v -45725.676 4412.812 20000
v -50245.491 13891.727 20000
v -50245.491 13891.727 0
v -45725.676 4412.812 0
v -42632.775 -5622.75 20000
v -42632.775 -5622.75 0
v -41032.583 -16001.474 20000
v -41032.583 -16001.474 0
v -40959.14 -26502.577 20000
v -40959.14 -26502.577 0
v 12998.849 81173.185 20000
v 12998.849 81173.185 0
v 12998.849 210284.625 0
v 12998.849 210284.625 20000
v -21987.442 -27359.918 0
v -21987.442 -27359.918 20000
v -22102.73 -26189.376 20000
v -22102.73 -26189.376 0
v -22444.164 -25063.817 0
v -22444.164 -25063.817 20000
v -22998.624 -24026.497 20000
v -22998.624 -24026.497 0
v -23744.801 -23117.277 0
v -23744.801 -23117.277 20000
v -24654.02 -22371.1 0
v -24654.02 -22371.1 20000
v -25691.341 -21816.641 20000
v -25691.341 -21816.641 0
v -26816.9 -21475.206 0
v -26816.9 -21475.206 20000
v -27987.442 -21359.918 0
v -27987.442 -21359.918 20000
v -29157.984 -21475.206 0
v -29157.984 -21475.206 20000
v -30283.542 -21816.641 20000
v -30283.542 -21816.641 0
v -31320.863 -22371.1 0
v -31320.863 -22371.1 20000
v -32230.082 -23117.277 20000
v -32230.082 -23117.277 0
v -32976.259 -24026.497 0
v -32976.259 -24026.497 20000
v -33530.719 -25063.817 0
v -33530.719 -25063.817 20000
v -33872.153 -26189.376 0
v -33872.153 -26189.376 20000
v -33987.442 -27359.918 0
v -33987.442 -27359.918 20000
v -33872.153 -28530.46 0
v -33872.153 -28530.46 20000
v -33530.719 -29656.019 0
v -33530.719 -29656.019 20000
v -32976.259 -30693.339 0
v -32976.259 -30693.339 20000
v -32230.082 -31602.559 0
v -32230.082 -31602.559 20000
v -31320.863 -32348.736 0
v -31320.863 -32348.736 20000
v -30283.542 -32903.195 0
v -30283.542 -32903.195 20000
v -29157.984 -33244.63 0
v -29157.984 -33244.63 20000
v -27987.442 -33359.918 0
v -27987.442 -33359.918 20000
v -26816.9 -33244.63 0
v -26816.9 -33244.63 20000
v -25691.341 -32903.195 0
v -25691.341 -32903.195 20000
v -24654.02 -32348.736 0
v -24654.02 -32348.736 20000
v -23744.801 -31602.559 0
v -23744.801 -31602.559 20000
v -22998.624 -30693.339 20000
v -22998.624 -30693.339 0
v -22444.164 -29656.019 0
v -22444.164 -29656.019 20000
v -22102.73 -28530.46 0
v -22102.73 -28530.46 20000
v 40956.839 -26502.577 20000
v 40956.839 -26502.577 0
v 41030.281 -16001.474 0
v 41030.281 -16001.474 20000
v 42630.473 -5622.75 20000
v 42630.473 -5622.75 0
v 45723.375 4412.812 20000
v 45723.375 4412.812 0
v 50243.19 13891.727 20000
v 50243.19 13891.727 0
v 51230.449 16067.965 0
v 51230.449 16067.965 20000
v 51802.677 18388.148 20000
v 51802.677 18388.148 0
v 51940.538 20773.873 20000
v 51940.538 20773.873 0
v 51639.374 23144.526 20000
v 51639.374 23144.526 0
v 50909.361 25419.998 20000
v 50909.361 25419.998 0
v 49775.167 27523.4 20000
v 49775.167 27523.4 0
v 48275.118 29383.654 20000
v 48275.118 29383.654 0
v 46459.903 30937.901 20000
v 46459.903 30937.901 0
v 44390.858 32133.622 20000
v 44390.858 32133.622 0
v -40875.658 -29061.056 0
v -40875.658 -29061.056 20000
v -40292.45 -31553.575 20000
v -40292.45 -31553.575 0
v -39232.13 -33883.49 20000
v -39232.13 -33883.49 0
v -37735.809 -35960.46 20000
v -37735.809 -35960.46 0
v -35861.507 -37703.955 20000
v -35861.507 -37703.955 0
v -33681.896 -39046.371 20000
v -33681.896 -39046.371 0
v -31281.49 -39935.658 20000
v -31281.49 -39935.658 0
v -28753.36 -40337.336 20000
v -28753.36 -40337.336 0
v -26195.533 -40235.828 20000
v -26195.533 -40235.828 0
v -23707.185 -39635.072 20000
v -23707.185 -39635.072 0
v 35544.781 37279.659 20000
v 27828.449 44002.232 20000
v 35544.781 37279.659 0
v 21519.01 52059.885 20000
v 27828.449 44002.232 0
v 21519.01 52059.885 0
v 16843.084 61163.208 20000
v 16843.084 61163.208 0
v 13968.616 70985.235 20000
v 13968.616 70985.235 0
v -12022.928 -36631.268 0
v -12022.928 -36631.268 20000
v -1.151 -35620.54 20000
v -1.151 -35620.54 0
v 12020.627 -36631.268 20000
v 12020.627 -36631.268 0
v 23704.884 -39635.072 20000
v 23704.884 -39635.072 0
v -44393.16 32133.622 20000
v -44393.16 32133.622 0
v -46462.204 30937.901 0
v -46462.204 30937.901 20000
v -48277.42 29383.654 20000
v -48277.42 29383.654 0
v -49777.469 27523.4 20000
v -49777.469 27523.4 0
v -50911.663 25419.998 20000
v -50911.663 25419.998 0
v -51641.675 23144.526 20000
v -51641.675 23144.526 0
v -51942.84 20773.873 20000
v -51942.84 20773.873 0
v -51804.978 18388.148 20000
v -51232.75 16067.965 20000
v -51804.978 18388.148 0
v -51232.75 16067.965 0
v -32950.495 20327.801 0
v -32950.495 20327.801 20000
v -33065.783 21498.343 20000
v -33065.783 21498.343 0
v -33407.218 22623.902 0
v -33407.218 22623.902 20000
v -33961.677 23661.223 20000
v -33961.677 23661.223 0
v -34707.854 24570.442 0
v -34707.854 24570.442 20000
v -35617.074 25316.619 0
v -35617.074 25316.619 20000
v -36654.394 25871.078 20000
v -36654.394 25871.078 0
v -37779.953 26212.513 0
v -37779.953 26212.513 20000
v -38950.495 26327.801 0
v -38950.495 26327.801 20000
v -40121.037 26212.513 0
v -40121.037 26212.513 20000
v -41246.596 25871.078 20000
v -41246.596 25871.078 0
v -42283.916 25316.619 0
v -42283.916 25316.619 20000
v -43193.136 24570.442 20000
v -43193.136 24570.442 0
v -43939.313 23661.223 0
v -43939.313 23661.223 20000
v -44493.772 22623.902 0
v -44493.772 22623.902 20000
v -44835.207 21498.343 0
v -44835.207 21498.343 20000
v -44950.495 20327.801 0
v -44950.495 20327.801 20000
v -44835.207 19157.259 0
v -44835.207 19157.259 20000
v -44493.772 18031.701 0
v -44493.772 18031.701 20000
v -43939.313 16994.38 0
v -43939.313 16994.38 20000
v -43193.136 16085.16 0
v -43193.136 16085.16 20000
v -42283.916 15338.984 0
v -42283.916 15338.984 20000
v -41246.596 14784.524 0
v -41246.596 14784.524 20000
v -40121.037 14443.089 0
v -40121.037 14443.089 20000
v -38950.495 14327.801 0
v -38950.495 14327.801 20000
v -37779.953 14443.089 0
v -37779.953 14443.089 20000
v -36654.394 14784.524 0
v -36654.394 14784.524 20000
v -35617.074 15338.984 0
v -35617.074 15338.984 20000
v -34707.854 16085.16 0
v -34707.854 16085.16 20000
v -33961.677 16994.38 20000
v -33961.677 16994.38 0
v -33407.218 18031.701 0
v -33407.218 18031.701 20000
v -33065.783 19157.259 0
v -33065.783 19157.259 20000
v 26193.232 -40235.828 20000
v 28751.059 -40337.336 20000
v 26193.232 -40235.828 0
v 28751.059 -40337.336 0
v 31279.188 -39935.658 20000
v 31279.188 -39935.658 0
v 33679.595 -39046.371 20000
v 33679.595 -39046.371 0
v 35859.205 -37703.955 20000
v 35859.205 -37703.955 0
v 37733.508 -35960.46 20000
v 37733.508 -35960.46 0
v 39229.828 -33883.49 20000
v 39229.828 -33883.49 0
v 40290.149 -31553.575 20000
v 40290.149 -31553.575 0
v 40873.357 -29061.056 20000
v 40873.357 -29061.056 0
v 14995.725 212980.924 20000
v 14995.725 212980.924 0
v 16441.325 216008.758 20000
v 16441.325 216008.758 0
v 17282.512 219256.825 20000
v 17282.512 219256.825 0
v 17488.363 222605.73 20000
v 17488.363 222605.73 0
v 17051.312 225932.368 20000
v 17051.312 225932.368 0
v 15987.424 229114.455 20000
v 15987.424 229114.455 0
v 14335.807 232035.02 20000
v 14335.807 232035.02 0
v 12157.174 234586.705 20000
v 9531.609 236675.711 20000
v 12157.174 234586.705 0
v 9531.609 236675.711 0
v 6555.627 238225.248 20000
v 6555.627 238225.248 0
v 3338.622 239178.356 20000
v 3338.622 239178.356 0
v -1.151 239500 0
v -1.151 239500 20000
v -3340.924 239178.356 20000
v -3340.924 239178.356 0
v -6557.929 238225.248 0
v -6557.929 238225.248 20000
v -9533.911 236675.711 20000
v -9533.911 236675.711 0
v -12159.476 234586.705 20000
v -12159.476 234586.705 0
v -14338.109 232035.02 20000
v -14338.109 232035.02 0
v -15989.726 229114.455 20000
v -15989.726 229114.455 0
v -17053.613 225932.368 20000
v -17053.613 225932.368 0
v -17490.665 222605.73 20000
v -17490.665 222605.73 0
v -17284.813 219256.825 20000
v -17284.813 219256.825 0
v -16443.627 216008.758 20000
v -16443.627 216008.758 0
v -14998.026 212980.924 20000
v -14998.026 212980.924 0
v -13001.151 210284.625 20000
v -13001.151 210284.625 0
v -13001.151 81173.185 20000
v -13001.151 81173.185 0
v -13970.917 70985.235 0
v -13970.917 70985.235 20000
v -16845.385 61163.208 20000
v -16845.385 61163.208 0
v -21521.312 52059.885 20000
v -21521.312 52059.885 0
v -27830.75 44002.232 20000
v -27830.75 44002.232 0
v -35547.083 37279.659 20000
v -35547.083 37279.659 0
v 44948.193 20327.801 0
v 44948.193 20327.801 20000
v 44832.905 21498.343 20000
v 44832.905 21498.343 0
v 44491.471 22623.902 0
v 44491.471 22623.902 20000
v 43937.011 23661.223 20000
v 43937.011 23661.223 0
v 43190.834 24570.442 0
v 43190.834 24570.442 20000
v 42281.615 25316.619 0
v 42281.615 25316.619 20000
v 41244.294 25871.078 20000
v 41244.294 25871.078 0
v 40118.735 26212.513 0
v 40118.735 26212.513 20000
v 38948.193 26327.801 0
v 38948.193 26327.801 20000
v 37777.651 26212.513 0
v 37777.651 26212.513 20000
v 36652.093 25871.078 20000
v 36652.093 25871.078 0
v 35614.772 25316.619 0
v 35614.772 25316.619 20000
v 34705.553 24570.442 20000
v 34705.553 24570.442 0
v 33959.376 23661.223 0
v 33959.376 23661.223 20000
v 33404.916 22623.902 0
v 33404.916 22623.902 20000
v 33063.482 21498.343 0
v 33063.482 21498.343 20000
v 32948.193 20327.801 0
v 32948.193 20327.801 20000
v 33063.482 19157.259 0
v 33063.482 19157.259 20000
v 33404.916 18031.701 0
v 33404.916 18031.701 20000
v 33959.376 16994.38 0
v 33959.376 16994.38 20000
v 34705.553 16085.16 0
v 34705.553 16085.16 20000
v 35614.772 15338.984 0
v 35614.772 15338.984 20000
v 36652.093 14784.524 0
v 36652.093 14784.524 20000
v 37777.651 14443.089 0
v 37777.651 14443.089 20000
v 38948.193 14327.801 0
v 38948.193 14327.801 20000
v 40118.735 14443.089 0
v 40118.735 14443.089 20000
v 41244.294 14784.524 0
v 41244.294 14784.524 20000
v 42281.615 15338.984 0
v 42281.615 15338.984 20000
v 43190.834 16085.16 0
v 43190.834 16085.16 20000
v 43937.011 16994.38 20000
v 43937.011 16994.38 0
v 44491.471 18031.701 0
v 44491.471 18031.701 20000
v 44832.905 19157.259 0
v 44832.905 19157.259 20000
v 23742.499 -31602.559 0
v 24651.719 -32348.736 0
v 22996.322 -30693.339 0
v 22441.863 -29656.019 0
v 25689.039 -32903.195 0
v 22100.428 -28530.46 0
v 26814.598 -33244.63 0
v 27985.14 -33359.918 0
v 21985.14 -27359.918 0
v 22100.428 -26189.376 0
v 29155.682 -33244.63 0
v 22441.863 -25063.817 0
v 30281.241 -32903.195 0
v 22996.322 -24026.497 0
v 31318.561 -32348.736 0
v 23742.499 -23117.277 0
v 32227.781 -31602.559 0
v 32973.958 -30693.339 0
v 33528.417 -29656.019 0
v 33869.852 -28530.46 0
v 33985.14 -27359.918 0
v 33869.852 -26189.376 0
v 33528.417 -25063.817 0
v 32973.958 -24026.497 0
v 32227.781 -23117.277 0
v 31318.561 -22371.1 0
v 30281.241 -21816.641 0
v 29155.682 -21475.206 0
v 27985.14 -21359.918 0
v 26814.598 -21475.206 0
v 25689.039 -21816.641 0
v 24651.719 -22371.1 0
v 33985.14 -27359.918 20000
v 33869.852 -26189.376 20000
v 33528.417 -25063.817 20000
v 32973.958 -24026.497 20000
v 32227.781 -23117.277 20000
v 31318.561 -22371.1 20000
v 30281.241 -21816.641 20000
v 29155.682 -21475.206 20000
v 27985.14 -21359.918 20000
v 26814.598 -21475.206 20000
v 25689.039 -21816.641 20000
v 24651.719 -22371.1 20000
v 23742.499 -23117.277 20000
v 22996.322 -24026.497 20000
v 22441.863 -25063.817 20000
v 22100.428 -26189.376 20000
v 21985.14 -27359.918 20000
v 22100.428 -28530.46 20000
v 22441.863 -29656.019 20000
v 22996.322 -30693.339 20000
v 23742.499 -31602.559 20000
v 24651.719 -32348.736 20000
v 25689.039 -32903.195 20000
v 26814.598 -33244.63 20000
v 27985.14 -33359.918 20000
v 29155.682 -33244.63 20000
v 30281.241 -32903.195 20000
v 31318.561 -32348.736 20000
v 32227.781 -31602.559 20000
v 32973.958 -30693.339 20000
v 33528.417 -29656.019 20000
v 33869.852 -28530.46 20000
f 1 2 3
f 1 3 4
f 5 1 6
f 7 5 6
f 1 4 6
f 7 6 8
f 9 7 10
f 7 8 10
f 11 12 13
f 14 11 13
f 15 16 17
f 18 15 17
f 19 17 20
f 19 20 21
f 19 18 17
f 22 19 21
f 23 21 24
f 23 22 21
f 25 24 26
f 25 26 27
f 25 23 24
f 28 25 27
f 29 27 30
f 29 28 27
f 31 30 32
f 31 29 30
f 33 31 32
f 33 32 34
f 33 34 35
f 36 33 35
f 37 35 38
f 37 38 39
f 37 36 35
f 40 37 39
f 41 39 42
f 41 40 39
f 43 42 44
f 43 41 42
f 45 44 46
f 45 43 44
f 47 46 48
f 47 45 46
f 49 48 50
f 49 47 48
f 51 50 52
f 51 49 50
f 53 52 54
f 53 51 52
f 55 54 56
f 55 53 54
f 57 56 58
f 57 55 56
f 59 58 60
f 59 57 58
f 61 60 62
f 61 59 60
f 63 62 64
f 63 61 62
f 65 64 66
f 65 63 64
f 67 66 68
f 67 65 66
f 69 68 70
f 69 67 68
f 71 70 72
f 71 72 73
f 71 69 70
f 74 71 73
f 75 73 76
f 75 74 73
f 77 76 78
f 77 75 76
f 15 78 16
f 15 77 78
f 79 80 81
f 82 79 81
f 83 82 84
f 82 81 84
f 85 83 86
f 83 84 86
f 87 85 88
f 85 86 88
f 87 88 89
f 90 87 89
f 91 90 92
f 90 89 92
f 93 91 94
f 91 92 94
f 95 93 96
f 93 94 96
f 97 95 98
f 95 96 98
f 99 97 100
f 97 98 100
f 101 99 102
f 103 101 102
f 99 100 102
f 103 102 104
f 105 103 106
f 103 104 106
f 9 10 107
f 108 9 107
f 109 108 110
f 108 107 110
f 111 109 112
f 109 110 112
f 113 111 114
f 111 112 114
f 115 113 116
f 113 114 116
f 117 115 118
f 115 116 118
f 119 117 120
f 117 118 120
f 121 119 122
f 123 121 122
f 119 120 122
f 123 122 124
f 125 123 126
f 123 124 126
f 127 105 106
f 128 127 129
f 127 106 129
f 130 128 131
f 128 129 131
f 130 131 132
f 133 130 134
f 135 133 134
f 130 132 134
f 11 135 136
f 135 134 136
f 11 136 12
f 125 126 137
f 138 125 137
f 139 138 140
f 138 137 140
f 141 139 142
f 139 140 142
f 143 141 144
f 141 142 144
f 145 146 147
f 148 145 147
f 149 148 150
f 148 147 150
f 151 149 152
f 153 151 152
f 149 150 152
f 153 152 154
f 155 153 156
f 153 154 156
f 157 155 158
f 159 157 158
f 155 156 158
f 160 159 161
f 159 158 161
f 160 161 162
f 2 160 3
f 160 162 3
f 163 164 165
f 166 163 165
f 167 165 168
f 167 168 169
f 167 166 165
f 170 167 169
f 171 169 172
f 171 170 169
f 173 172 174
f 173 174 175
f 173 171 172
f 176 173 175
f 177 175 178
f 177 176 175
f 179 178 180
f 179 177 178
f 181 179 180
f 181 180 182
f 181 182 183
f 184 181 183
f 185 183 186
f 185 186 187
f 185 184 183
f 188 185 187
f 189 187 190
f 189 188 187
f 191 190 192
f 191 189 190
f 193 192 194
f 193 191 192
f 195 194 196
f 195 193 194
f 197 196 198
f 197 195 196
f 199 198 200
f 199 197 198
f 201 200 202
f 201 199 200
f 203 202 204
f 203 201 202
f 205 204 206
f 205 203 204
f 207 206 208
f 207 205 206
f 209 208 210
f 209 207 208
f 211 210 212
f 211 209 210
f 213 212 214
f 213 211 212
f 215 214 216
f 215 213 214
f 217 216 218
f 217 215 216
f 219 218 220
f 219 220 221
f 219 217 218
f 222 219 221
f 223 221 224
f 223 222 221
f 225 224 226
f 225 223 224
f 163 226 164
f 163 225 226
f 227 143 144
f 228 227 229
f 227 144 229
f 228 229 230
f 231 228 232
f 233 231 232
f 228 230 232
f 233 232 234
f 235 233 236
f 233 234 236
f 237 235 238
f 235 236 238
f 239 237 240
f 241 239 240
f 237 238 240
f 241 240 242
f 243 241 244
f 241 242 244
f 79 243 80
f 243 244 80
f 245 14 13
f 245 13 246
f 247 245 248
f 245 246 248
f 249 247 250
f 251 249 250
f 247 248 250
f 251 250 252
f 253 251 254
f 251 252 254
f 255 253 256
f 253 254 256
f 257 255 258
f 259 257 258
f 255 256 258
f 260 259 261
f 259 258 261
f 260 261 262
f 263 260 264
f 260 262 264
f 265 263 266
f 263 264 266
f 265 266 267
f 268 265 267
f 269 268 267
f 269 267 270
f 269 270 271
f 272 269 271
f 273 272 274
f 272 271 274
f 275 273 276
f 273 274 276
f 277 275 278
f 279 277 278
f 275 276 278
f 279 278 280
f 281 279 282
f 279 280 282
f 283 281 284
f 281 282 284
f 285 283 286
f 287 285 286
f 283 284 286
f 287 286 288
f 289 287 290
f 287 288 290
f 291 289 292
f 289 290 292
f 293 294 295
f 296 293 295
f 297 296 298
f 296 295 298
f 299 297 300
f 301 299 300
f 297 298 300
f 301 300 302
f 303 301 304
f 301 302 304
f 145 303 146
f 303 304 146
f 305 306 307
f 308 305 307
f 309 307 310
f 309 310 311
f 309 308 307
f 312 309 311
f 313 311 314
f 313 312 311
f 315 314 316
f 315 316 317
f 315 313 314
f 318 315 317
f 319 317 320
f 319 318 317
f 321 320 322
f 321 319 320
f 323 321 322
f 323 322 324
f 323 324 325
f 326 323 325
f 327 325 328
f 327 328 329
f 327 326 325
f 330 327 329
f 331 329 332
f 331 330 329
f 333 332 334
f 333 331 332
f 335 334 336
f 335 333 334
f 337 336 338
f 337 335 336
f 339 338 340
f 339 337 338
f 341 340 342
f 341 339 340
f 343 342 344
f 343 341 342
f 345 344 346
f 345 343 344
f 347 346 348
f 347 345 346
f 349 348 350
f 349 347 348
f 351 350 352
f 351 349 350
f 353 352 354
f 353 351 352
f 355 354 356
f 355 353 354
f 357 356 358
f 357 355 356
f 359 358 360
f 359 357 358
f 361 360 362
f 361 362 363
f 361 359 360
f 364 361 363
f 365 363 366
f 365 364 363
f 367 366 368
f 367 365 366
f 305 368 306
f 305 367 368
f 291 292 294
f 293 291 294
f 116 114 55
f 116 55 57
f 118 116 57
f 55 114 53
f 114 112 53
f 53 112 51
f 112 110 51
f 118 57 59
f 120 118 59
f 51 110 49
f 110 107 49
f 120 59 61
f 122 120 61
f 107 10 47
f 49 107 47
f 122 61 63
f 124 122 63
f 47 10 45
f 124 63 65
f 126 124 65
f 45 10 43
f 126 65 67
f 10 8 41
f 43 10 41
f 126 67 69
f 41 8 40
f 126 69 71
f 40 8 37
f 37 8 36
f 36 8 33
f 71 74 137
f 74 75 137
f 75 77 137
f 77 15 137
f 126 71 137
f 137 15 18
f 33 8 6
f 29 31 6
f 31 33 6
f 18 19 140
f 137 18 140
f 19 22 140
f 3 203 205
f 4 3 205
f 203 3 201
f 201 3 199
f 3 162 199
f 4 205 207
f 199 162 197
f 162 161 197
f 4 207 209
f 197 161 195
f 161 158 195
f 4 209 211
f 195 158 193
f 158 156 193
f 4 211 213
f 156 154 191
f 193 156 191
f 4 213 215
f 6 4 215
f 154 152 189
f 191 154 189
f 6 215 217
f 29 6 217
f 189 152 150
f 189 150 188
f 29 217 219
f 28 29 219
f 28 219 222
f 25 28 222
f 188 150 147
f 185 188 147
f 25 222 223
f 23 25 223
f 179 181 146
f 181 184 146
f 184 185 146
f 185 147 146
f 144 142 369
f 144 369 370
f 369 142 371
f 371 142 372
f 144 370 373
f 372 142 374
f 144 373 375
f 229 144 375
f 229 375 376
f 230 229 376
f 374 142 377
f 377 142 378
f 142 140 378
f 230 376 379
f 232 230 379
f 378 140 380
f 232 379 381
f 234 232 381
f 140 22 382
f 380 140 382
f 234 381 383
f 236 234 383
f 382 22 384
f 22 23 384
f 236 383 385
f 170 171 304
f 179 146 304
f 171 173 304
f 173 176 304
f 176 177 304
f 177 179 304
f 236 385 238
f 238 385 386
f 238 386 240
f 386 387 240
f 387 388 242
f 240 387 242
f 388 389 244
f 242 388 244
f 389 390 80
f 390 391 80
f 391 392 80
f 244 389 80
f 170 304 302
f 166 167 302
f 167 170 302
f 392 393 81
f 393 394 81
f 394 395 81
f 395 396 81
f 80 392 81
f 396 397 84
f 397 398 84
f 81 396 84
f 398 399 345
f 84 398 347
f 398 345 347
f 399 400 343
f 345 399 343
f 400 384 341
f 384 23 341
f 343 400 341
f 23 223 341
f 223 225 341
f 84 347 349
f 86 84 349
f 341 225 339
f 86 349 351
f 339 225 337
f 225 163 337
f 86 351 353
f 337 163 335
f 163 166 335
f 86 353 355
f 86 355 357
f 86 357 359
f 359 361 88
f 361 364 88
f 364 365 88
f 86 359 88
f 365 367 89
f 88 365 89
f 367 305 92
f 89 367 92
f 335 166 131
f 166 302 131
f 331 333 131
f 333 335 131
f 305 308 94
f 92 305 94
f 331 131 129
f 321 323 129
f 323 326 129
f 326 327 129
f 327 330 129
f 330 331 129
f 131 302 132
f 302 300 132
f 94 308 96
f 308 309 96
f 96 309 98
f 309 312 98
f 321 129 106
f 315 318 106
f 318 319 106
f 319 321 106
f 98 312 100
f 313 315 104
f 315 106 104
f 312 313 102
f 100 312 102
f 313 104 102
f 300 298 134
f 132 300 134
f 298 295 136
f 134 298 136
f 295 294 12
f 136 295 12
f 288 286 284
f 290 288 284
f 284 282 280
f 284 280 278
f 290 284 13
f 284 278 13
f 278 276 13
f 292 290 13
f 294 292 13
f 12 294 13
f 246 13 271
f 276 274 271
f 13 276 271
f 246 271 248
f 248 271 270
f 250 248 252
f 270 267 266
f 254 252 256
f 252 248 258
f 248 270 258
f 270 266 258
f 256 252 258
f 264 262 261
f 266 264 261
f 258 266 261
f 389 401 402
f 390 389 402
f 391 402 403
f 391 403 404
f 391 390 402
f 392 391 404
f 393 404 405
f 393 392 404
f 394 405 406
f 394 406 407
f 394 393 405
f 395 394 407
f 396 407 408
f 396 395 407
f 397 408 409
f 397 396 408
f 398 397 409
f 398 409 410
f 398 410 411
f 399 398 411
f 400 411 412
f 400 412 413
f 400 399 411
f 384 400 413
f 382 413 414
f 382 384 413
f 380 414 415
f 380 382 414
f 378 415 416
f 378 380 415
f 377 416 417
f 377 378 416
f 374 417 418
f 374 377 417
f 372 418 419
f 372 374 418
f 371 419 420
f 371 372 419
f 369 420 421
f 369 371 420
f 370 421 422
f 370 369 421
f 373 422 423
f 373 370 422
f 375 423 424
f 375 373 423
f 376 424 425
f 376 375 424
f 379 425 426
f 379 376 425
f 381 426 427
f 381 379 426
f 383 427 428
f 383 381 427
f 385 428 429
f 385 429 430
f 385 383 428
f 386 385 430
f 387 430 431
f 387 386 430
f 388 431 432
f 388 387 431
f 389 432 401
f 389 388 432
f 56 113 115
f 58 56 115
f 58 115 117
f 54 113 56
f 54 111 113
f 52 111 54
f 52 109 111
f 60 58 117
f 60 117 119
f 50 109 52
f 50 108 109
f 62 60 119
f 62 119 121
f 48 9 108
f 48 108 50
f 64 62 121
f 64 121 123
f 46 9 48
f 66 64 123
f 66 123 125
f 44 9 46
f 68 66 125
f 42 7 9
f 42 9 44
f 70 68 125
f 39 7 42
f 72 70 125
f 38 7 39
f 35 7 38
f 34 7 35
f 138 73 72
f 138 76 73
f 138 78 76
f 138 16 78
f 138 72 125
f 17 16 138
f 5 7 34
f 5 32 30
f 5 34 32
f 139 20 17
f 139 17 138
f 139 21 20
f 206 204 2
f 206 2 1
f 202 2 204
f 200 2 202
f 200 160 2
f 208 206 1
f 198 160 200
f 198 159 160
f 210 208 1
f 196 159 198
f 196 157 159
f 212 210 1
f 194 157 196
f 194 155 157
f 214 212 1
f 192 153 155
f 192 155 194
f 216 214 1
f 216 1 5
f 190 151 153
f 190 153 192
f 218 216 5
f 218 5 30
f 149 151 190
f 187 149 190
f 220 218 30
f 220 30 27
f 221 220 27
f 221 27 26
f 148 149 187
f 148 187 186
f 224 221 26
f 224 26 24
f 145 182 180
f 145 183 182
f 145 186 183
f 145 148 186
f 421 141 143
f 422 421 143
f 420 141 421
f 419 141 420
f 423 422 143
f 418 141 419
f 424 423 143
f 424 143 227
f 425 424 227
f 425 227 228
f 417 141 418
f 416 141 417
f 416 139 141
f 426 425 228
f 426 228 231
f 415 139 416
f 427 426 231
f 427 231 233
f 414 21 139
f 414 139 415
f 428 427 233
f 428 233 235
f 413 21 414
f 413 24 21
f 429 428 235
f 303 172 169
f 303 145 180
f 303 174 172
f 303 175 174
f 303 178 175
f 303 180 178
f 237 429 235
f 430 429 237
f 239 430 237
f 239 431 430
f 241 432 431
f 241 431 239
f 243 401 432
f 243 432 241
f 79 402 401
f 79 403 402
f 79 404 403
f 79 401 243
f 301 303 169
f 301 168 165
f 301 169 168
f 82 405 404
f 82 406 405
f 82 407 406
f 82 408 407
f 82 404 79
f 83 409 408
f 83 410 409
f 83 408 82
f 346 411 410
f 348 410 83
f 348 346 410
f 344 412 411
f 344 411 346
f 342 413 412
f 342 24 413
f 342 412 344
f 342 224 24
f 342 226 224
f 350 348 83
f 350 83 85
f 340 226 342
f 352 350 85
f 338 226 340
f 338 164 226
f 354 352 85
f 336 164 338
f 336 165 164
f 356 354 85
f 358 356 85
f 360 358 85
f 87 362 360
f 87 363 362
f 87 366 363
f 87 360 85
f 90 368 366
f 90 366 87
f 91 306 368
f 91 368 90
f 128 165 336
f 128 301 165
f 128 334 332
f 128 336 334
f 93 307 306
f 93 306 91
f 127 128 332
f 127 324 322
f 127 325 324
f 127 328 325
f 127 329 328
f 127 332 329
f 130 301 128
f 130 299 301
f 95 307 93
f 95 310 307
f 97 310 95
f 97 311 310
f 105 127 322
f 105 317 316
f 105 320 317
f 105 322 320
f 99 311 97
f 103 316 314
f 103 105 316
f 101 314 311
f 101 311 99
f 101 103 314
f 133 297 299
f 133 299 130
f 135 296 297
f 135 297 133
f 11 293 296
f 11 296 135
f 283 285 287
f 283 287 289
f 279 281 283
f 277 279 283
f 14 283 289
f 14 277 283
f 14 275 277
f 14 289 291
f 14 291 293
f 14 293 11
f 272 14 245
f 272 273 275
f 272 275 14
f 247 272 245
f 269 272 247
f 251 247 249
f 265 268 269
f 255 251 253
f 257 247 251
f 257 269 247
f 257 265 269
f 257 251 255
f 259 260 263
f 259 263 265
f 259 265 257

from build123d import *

# Parameters (mm, degrees)
SKETCH1_R           = 6000
BOSS_EXTRUDE2_DEPTH = 20000


with BuildPart() as part:
    # Sketch1 → Boss-Extrude2 (new body)
    with BuildSketch(Plane.XY):
        with BuildLine():
            ThreePointArc((44390.857987613, 32133.621884428), (21519.010141486, 52059.884818003), (12998.849230427, 81173.184810343))
            Line((12998.849230427, 81173.184810343), (12998.849230427, 210284.62548614))
            ThreePointArc((12998.849230427, 210284.62548614), (-1.150769573, 239500), (-13001.150769573, 210284.62548614))
            Line((-13001.150769573, 210284.62548614), (-13001.150769573, 81173.184810343))
            ThreePointArc((-13001.150769573, 81173.184810343), (-21521.311680632, 52059.884818003), (-44393.159526759, 32133.621884428))
            ThreePointArc((-44393.159526759, 32133.621884428), (-51329.065558996, 24299.0717741), (-50245.491347745, 13891.726538739))
            ThreePointArc((-50245.491347745, 13891.726538739), (-42632.774930501, -5622.749647829), (-40959.140278036, -26502.576733693))
            ThreePointArc((-40959.140278036, -26502.576733693), (-35861.506690488, -37703.954856701), (-23707.185374082, -39635.071990656))
            ThreePointArc((-23707.185374082, -39635.071990656), (-1.150769573, -35620.540462453), (23704.883834937, -39635.071990656))
            ThreePointArc((23704.883834937, -39635.071990656), (35859.205151343, -37703.954856701), (40956.83873889, -26502.576733693))
            ThreePointArc((40956.83873889, -26502.576733693), (42630.473391356, -5622.749647829), (50243.1898086, 13891.726538739))
            ThreePointArc((50243.1898086, 13891.726538739), (51326.764019851, 24299.0717741), (44390.857987613, 32133.621884428))
        make_face()
        with Locations((-27987.441622119, -27359.917961025)):
            Circle(SKETCH1_R, mode=Mode.SUBTRACT)
        with Locations((-38950.494968304, 20327.80118004)):
            Circle(SKETCH1_R, mode=Mode.SUBTRACT)
        with Locations((27985.140082973, -27359.917961025)):
            Circle(SKETCH1_R, mode=Mode.SUBTRACT)
        with Locations((38948.193429158, 20327.80118004)):
            Circle(SKETCH1_R, mode=Mode.SUBTRACT)
    extrude(amount=BOSS_EXTRUDE2_DEPTH)


solid = part.part
